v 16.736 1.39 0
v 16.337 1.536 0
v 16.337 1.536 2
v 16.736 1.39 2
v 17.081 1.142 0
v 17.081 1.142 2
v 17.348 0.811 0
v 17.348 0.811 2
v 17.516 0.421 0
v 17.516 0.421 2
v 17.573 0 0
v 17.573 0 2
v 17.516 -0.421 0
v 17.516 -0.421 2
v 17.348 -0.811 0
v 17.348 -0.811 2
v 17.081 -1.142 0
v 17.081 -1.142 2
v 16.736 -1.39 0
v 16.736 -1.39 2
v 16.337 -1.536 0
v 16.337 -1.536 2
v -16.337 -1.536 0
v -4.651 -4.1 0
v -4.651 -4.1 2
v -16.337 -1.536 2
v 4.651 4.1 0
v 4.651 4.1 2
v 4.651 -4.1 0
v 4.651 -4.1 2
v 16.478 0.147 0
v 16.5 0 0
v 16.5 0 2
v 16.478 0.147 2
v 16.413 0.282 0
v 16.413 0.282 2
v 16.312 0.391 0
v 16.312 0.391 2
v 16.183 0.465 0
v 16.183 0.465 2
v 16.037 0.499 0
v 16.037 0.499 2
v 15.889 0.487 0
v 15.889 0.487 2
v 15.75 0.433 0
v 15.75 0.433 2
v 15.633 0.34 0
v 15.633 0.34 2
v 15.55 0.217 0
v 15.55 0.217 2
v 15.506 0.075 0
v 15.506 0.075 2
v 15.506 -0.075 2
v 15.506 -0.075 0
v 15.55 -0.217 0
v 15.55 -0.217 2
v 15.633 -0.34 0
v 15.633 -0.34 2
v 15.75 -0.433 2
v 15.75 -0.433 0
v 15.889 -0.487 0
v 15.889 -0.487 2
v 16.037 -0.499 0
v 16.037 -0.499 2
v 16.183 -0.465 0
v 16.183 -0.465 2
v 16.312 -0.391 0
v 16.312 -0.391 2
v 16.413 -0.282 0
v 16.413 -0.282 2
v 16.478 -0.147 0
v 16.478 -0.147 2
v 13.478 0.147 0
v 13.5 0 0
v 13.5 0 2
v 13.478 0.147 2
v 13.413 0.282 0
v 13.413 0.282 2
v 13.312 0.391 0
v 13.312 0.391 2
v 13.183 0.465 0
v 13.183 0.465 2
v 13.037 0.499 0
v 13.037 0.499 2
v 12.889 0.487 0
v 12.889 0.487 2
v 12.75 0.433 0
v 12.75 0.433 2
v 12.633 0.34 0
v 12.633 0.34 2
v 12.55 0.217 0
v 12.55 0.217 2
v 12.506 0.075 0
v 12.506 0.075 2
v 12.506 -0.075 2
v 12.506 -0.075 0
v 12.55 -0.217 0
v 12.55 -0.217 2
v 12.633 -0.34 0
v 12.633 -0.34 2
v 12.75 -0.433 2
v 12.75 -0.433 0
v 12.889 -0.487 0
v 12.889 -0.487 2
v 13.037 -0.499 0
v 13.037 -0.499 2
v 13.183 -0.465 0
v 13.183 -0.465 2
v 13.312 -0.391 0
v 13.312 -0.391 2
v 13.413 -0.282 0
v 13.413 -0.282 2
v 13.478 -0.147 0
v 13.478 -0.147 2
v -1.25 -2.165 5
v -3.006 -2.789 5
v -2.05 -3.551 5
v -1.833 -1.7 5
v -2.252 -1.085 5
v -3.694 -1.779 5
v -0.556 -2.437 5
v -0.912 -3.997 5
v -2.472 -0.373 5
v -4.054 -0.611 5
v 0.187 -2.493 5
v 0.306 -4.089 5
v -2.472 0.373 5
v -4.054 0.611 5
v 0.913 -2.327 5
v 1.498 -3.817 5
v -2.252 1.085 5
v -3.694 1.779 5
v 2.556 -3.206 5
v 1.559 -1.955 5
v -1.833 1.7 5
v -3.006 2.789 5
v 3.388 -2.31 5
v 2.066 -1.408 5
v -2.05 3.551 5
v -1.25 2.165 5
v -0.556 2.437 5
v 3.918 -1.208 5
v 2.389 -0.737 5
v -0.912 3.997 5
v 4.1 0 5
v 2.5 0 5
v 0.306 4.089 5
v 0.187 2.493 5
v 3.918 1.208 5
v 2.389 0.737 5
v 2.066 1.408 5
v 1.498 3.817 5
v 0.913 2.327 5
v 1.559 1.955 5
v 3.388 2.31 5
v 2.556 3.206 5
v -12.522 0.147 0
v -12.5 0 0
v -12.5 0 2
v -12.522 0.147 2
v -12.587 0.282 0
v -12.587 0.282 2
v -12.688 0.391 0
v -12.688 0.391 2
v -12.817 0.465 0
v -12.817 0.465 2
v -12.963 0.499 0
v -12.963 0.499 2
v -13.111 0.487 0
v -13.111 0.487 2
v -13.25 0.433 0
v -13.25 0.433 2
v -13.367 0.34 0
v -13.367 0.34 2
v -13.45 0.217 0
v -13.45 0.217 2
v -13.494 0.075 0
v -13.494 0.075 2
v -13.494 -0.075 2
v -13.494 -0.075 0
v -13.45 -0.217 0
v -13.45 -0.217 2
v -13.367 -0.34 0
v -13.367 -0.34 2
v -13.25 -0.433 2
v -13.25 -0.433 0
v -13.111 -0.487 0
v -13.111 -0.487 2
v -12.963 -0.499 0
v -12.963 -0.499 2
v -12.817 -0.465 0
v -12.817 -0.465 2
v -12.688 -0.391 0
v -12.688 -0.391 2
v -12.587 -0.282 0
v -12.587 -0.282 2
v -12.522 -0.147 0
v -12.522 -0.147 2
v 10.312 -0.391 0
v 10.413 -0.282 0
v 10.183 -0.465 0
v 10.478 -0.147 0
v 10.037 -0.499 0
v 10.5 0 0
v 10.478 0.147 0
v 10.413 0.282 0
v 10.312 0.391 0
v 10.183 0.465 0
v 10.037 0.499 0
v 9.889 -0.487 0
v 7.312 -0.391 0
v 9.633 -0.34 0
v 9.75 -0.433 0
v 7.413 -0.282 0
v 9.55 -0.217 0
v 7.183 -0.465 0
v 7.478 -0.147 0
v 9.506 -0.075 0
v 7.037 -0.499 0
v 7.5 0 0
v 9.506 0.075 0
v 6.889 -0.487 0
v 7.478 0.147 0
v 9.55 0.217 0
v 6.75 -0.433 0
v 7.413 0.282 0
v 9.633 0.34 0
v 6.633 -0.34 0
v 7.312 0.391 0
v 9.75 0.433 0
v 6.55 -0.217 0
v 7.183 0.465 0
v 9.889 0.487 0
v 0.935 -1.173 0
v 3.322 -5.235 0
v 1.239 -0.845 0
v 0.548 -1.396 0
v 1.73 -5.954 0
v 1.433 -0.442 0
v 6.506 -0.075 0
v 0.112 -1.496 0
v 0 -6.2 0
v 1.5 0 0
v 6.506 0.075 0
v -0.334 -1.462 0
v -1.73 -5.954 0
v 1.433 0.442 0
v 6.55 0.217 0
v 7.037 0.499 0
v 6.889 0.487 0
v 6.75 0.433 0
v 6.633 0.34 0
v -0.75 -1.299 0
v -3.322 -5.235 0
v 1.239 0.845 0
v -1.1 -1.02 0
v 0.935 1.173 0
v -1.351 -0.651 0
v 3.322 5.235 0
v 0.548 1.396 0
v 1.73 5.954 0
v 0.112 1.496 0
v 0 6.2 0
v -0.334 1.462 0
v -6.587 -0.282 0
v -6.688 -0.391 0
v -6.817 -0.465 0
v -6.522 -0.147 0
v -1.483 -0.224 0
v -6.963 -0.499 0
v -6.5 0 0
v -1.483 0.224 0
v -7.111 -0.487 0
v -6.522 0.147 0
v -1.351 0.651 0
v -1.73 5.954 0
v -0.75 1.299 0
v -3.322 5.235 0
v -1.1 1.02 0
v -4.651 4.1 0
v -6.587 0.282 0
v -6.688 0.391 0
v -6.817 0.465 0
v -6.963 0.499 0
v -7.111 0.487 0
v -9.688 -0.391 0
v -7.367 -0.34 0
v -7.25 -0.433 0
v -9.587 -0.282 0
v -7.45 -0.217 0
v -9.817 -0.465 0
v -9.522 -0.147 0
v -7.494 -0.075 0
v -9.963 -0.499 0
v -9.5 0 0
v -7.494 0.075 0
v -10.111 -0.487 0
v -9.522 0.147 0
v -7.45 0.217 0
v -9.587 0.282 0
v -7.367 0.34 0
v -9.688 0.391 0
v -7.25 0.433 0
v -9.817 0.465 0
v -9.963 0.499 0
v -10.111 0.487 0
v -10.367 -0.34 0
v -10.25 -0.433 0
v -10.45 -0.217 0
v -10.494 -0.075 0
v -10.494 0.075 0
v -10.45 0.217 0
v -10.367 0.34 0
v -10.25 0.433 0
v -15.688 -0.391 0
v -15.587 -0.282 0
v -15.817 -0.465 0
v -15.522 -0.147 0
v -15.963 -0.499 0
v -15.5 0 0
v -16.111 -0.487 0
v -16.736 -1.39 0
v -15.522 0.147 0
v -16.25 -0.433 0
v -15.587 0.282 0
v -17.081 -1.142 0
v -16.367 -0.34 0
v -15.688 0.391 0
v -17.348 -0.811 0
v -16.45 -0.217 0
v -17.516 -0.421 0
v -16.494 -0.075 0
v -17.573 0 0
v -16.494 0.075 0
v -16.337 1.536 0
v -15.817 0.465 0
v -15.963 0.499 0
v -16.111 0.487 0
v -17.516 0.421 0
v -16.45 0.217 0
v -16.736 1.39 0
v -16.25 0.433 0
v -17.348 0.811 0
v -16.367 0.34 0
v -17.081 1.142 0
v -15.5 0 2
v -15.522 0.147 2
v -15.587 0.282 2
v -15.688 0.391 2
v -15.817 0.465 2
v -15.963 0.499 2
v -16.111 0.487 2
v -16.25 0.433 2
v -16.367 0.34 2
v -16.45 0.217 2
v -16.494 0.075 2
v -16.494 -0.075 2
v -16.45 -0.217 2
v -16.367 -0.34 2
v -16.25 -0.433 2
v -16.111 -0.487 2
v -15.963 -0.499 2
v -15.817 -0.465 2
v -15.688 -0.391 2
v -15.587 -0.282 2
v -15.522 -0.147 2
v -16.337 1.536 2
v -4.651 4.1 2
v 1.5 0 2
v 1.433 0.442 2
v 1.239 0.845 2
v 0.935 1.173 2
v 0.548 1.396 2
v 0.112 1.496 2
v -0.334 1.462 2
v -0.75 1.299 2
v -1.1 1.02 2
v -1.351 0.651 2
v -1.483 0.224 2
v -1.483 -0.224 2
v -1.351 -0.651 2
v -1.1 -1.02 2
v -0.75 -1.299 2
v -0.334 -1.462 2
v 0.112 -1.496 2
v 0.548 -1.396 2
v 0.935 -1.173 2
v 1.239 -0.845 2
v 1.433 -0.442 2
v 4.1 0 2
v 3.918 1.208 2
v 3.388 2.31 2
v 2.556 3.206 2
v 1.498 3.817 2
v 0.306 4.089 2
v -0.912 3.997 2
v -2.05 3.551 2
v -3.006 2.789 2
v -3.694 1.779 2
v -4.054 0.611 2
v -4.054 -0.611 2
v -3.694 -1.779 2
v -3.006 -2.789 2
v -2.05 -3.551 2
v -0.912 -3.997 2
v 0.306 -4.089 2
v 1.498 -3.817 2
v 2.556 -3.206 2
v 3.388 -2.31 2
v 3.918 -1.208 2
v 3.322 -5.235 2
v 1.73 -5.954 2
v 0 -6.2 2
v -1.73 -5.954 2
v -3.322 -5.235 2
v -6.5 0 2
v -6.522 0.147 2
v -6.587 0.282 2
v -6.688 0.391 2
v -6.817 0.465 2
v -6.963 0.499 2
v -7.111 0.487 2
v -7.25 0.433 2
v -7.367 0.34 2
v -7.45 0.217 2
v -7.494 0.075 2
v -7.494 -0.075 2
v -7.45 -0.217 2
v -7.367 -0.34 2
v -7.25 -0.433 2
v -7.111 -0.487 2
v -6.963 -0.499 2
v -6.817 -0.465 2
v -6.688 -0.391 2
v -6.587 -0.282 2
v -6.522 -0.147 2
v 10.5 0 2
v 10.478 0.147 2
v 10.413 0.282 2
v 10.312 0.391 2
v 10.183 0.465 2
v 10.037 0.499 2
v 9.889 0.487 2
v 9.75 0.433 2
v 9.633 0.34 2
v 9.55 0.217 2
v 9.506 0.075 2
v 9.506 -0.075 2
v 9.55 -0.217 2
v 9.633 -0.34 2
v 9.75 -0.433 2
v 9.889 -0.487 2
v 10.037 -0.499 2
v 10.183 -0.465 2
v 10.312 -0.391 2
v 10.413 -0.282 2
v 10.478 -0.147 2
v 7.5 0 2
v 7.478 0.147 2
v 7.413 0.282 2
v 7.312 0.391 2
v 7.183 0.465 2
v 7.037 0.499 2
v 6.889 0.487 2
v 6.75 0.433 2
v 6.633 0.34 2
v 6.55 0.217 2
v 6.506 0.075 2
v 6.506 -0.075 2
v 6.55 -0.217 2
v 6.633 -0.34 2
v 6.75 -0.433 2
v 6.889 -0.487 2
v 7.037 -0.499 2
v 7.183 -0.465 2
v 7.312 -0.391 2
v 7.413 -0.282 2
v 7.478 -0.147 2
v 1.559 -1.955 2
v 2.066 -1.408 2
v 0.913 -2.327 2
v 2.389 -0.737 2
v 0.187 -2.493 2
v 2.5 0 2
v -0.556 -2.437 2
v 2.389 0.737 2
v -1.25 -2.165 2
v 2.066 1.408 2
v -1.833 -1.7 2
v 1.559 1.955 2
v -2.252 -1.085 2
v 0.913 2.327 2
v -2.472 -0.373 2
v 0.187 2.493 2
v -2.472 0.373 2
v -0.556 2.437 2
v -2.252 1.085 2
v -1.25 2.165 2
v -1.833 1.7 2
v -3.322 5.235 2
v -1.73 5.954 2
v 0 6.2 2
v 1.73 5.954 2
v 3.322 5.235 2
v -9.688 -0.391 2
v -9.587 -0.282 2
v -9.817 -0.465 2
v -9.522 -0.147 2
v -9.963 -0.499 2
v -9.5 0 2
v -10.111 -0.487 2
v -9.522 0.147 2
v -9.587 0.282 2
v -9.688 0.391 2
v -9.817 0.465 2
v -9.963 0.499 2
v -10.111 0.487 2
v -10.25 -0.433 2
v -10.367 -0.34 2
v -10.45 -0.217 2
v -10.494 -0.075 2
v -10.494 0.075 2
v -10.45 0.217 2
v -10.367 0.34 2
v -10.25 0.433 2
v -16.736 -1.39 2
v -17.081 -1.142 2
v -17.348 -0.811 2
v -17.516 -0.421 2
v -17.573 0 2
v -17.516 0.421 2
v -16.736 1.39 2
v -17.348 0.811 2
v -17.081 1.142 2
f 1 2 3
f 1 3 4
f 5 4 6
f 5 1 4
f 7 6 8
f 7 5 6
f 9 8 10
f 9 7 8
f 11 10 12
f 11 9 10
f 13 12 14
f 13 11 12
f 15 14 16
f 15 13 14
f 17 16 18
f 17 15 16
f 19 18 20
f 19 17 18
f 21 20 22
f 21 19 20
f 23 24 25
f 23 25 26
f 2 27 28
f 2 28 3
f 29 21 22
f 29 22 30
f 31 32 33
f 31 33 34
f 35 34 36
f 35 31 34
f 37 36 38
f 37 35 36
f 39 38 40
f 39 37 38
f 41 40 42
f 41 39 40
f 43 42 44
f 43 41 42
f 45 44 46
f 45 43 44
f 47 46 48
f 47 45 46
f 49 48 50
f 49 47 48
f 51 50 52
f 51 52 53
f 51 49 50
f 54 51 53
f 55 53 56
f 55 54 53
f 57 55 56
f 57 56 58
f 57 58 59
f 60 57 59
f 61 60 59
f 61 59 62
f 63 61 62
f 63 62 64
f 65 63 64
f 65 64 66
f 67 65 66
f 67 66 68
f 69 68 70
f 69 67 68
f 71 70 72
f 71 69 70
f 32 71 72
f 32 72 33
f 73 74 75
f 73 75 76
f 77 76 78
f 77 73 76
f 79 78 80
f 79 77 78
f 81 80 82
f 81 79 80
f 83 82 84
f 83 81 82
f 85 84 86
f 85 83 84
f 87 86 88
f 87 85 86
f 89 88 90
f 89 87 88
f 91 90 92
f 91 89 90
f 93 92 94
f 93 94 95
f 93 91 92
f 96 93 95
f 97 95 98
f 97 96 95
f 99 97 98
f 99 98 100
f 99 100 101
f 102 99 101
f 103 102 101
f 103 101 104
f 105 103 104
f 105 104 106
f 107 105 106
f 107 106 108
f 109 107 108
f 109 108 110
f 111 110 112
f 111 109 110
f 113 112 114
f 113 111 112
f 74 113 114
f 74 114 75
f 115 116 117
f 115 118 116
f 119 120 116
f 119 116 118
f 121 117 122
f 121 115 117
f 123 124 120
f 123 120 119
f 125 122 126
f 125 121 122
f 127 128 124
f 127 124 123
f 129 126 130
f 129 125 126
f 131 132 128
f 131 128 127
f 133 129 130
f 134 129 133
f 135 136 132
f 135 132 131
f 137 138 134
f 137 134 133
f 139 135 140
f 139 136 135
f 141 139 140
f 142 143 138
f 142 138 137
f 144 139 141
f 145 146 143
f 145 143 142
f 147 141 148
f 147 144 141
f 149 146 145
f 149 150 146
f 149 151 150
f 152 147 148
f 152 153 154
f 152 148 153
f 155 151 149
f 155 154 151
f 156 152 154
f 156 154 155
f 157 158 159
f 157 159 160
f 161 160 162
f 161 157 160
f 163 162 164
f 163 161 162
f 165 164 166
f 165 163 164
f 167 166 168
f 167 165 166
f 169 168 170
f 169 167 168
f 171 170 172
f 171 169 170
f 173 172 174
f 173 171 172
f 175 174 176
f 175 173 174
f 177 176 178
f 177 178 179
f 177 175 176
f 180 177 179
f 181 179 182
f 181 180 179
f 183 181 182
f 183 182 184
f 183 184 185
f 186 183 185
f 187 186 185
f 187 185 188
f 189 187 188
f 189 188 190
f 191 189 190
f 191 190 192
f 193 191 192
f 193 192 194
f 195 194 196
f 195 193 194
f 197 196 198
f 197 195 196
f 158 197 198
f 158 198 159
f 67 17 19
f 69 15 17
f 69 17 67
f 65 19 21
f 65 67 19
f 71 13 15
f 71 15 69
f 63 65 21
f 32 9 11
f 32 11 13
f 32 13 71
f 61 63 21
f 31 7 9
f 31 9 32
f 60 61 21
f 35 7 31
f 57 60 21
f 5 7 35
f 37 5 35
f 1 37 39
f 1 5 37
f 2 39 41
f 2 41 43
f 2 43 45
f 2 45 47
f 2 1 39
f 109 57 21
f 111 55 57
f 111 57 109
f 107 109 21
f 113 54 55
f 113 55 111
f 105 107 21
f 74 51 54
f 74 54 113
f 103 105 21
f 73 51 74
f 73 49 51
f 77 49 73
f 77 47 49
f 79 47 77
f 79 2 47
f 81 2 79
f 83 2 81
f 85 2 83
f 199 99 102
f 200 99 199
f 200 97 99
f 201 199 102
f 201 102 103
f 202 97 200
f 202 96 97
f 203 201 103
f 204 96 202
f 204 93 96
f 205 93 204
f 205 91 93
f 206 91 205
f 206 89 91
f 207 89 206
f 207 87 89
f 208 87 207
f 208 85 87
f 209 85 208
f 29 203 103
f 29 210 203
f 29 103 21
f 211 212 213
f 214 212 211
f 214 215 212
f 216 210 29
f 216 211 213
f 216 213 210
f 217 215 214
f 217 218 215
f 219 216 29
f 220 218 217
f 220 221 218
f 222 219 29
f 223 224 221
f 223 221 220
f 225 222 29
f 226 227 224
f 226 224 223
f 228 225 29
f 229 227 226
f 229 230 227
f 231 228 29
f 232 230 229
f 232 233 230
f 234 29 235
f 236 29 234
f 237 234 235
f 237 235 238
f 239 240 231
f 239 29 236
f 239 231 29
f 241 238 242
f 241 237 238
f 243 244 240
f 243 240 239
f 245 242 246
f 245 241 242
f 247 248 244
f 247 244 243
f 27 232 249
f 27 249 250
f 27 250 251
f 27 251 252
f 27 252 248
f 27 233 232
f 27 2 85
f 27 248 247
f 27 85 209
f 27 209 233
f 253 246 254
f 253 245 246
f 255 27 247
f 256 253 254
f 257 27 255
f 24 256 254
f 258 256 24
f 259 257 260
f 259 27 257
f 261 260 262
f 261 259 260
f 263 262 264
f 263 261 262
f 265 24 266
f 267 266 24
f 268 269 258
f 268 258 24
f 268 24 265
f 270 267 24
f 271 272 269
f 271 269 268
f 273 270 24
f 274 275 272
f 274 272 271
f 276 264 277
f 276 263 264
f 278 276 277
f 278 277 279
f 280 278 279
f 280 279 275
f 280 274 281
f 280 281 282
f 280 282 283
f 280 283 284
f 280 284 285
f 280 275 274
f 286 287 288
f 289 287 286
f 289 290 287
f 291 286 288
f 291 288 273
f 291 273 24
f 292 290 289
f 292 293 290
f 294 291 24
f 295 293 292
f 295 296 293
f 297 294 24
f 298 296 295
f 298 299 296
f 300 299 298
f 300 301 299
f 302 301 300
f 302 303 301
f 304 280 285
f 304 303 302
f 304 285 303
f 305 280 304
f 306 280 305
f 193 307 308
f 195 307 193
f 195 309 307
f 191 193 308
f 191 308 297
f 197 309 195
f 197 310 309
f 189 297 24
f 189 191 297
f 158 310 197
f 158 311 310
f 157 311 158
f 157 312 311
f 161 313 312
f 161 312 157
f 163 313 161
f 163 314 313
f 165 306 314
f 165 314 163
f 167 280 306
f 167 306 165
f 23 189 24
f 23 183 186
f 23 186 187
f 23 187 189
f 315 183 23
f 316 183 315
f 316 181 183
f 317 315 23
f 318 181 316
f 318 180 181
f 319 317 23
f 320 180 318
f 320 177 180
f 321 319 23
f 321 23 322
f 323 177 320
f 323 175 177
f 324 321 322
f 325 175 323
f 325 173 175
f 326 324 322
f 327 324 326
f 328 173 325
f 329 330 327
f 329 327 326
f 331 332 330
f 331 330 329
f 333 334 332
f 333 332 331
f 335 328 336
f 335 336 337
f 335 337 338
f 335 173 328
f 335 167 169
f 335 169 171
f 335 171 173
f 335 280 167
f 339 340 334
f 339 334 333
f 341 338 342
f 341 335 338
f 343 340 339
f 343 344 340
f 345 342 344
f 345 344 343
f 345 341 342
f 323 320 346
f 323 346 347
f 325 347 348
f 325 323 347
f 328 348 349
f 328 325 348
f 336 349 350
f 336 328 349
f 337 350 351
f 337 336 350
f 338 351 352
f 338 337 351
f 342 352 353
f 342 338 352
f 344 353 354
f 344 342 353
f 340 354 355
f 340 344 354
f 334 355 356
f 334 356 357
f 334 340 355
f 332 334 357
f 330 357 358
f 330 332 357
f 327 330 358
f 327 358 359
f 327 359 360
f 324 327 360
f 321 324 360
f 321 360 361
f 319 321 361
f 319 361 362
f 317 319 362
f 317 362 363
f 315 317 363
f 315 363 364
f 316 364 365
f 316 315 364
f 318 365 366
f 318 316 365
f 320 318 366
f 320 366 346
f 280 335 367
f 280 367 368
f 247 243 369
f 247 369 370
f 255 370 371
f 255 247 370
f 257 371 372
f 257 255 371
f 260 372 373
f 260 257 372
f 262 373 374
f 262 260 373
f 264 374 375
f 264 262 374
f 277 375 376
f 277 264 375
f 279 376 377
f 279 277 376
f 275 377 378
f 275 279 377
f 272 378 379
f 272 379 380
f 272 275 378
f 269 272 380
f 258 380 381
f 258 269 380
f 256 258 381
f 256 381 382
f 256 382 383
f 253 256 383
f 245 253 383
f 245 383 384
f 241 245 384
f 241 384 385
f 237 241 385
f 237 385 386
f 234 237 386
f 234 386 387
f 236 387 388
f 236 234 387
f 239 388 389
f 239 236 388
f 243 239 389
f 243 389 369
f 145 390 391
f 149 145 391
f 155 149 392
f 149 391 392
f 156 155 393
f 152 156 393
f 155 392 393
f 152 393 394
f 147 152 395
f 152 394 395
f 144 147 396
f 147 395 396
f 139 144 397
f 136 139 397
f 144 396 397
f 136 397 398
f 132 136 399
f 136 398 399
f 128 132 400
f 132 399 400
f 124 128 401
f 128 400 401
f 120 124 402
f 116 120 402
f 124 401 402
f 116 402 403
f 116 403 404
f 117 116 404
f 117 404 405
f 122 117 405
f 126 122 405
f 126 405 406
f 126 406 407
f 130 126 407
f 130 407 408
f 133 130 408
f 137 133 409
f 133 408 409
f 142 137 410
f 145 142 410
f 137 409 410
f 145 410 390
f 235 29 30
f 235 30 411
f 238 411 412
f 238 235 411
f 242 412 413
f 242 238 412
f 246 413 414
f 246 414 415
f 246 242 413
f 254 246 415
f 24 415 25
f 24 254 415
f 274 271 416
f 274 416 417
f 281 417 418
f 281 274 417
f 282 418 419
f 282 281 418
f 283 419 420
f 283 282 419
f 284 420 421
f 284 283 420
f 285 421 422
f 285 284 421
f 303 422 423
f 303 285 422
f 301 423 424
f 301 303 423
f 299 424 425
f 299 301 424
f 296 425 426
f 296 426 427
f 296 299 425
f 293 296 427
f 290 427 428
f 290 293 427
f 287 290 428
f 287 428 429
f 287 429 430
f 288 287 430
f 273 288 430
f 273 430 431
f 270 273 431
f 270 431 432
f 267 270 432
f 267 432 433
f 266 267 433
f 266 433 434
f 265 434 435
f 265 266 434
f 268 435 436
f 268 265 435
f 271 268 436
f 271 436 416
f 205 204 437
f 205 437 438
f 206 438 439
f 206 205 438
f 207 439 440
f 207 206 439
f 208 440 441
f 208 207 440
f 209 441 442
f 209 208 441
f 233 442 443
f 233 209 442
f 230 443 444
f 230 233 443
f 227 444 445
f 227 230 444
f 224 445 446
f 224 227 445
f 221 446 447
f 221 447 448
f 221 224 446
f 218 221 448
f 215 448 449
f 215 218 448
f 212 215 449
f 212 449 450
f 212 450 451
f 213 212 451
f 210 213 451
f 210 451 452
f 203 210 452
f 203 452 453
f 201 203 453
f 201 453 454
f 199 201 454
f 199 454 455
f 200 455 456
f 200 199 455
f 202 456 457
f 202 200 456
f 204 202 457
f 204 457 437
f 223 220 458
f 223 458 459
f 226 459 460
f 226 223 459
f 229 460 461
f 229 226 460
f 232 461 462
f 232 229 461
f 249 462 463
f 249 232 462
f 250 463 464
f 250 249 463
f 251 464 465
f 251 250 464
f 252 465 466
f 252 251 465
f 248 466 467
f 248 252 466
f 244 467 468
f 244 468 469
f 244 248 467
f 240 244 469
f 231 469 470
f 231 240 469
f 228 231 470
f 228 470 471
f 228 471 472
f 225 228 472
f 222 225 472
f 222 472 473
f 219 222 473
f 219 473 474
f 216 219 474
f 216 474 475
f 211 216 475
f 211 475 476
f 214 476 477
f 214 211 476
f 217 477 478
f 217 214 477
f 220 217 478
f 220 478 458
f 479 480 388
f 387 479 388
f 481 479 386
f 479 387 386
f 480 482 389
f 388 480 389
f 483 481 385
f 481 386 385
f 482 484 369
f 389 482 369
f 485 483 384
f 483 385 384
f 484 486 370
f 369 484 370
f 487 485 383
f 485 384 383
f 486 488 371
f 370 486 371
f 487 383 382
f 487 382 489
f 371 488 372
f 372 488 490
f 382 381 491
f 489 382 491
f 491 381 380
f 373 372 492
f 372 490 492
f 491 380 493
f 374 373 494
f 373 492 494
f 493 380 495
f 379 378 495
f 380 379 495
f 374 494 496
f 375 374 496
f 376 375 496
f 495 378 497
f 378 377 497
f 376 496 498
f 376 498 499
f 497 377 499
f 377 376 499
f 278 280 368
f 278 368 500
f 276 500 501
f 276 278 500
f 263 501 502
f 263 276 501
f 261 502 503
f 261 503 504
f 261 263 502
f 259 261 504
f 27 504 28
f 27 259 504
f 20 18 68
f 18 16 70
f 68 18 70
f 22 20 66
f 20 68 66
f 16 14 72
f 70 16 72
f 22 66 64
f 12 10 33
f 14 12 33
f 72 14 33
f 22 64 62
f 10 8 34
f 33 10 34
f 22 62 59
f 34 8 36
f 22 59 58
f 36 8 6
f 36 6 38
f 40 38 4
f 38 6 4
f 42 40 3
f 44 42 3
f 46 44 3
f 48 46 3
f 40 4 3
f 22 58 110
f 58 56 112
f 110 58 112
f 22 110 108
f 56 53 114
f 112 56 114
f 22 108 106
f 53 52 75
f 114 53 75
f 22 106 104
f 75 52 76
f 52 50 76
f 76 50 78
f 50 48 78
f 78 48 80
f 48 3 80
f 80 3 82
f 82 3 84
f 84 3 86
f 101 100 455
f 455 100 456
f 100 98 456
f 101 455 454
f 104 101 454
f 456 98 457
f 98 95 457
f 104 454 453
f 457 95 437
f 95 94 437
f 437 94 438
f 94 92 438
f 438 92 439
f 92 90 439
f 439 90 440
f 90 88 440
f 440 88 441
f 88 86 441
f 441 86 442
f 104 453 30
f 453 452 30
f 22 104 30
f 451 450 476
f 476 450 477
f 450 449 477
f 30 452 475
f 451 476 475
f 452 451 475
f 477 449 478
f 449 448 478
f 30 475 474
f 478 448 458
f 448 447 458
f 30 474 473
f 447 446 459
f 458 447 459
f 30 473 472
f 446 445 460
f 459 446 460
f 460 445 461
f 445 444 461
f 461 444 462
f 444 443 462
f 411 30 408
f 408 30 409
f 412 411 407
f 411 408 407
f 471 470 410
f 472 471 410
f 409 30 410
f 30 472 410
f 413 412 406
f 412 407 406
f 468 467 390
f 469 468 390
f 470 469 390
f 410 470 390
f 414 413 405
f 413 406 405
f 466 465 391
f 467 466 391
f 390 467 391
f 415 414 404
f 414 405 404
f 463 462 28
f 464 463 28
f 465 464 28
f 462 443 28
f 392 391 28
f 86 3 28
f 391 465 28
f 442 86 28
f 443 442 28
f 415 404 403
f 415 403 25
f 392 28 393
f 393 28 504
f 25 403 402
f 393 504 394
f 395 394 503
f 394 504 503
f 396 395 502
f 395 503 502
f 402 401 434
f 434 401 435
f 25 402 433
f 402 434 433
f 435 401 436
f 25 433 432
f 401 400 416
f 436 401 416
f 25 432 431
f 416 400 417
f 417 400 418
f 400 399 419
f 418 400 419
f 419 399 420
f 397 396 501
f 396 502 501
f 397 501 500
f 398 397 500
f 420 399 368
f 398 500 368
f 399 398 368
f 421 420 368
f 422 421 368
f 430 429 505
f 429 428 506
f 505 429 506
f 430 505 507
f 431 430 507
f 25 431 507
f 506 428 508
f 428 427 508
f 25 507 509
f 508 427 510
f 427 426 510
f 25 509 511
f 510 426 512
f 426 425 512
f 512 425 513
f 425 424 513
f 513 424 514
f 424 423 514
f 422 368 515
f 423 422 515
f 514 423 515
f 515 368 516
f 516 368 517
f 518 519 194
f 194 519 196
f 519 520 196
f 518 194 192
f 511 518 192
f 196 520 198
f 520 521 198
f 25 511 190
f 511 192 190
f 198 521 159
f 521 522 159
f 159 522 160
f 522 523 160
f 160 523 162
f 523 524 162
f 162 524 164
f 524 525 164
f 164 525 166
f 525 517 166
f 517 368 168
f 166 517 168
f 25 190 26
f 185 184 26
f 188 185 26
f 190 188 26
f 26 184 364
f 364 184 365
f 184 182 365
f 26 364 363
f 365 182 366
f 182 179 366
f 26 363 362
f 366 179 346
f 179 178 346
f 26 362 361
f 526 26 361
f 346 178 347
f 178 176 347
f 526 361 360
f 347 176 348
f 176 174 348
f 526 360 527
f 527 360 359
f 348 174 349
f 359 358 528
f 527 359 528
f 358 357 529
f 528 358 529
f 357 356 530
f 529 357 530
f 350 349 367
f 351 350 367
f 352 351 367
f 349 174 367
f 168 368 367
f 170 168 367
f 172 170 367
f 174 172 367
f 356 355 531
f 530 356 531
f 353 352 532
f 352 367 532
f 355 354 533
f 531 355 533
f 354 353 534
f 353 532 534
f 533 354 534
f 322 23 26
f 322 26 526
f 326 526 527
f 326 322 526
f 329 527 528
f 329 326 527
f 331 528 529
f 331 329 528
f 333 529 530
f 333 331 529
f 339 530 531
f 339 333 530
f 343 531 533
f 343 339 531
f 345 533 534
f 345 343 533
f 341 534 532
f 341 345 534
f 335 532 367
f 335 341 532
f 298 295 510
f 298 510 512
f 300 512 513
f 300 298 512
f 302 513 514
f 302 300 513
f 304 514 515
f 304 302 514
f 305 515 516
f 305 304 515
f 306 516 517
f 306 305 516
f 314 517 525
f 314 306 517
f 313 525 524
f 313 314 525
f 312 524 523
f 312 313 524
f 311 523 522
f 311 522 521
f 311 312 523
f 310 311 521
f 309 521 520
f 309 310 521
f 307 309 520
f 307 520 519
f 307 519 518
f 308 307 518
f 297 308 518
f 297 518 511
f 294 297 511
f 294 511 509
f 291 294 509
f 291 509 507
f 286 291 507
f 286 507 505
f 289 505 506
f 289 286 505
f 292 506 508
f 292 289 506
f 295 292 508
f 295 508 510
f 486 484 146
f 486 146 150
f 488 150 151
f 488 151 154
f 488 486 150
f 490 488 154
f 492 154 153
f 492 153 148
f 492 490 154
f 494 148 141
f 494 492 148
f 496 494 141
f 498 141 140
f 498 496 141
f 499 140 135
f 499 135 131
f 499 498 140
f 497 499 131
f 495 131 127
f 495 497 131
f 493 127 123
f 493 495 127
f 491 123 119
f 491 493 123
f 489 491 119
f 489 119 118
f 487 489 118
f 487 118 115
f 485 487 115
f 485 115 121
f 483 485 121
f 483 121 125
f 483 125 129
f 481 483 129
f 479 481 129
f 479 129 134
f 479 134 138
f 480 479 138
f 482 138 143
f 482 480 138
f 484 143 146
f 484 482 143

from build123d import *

# Parameters (mm, degrees)
ESQUISSE1_R        = 1.5
ESQUISSE1_R_2      = 0.5
BOSS_EXTRU_1_DEPTH = 2
ESQUISSE2_R        = 4.1
ESQUISSE2_R_2      = 2.5
BOSS_EXTRU_2_DEPTH = 3


with BuildPart() as part:
    # Esquisse1 → Boss.-Extru.1 (new body)
    with BuildSketch(Plane.XY):
        with BuildLine():
            Line((-16.337044695, 1.536467752), (-4.650806382, 4.1))
            ThreePointArc((-4.650806382, 4.1), (0, 6.2), (4.650806382, 4.1))
            Line((4.650806382, 4.1), (16.337044695, 1.536467752))
            ThreePointArc((16.337044695, 1.536467752), (17.573001042, 0), (16.337044695, -1.536467752))
            Line((16.337044695, -1.536467752), (4.650806382, -4.1))
            ThreePointArc((4.650806382, -4.1), (0, -6.2), (-4.650806382, -4.1))
            Line((-4.650806382, -4.1), (-16.337044695, -1.536467752))
            ThreePointArc((-16.337044695, -1.536467752), (-17.573001042, 0), (-16.337044695, 1.536467752))
        make_face()
        Circle(ESQUISSE1_R, mode=Mode.SUBTRACT)
        with Locations((7, 0)):
            Circle(ESQUISSE1_R_2, mode=Mode.SUBTRACT)
        with Locations((16, 0)):
            Circle(ESQUISSE1_R_2, mode=Mode.SUBTRACT)
        with Locations((13, 0)):
            Circle(ESQUISSE1_R_2, mode=Mode.SUBTRACT)
        with Locations((10, 0)):
            Circle(ESQUISSE1_R_2, mode=Mode.SUBTRACT)
        with Locations((-16, 0)):
            Circle(ESQUISSE1_R_2, mode=Mode.SUBTRACT)
        with Locations((-13, 0)):
            Circle(ESQUISSE1_R_2, mode=Mode.SUBTRACT)
        with Locations((-10, 0)):
            Circle(ESQUISSE1_R_2, mode=Mode.SUBTRACT)
        with Locations((-7, 0)):
            Circle(ESQUISSE1_R_2, mode=Mode.SUBTRACT)
    extrude(amount=BOSS_EXTRU_1_DEPTH)

    # Esquisse2 → Boss.-Extru.2 (add)
    with BuildSketch(Plane.XY.offset(2)):
        Circle(ESQUISSE2_R)
        Circle(ESQUISSE2_R_2, mode=Mode.SUBTRACT)
    extrude(amount=BOSS_EXTRU_2_DEPTH)


solid = part.part
